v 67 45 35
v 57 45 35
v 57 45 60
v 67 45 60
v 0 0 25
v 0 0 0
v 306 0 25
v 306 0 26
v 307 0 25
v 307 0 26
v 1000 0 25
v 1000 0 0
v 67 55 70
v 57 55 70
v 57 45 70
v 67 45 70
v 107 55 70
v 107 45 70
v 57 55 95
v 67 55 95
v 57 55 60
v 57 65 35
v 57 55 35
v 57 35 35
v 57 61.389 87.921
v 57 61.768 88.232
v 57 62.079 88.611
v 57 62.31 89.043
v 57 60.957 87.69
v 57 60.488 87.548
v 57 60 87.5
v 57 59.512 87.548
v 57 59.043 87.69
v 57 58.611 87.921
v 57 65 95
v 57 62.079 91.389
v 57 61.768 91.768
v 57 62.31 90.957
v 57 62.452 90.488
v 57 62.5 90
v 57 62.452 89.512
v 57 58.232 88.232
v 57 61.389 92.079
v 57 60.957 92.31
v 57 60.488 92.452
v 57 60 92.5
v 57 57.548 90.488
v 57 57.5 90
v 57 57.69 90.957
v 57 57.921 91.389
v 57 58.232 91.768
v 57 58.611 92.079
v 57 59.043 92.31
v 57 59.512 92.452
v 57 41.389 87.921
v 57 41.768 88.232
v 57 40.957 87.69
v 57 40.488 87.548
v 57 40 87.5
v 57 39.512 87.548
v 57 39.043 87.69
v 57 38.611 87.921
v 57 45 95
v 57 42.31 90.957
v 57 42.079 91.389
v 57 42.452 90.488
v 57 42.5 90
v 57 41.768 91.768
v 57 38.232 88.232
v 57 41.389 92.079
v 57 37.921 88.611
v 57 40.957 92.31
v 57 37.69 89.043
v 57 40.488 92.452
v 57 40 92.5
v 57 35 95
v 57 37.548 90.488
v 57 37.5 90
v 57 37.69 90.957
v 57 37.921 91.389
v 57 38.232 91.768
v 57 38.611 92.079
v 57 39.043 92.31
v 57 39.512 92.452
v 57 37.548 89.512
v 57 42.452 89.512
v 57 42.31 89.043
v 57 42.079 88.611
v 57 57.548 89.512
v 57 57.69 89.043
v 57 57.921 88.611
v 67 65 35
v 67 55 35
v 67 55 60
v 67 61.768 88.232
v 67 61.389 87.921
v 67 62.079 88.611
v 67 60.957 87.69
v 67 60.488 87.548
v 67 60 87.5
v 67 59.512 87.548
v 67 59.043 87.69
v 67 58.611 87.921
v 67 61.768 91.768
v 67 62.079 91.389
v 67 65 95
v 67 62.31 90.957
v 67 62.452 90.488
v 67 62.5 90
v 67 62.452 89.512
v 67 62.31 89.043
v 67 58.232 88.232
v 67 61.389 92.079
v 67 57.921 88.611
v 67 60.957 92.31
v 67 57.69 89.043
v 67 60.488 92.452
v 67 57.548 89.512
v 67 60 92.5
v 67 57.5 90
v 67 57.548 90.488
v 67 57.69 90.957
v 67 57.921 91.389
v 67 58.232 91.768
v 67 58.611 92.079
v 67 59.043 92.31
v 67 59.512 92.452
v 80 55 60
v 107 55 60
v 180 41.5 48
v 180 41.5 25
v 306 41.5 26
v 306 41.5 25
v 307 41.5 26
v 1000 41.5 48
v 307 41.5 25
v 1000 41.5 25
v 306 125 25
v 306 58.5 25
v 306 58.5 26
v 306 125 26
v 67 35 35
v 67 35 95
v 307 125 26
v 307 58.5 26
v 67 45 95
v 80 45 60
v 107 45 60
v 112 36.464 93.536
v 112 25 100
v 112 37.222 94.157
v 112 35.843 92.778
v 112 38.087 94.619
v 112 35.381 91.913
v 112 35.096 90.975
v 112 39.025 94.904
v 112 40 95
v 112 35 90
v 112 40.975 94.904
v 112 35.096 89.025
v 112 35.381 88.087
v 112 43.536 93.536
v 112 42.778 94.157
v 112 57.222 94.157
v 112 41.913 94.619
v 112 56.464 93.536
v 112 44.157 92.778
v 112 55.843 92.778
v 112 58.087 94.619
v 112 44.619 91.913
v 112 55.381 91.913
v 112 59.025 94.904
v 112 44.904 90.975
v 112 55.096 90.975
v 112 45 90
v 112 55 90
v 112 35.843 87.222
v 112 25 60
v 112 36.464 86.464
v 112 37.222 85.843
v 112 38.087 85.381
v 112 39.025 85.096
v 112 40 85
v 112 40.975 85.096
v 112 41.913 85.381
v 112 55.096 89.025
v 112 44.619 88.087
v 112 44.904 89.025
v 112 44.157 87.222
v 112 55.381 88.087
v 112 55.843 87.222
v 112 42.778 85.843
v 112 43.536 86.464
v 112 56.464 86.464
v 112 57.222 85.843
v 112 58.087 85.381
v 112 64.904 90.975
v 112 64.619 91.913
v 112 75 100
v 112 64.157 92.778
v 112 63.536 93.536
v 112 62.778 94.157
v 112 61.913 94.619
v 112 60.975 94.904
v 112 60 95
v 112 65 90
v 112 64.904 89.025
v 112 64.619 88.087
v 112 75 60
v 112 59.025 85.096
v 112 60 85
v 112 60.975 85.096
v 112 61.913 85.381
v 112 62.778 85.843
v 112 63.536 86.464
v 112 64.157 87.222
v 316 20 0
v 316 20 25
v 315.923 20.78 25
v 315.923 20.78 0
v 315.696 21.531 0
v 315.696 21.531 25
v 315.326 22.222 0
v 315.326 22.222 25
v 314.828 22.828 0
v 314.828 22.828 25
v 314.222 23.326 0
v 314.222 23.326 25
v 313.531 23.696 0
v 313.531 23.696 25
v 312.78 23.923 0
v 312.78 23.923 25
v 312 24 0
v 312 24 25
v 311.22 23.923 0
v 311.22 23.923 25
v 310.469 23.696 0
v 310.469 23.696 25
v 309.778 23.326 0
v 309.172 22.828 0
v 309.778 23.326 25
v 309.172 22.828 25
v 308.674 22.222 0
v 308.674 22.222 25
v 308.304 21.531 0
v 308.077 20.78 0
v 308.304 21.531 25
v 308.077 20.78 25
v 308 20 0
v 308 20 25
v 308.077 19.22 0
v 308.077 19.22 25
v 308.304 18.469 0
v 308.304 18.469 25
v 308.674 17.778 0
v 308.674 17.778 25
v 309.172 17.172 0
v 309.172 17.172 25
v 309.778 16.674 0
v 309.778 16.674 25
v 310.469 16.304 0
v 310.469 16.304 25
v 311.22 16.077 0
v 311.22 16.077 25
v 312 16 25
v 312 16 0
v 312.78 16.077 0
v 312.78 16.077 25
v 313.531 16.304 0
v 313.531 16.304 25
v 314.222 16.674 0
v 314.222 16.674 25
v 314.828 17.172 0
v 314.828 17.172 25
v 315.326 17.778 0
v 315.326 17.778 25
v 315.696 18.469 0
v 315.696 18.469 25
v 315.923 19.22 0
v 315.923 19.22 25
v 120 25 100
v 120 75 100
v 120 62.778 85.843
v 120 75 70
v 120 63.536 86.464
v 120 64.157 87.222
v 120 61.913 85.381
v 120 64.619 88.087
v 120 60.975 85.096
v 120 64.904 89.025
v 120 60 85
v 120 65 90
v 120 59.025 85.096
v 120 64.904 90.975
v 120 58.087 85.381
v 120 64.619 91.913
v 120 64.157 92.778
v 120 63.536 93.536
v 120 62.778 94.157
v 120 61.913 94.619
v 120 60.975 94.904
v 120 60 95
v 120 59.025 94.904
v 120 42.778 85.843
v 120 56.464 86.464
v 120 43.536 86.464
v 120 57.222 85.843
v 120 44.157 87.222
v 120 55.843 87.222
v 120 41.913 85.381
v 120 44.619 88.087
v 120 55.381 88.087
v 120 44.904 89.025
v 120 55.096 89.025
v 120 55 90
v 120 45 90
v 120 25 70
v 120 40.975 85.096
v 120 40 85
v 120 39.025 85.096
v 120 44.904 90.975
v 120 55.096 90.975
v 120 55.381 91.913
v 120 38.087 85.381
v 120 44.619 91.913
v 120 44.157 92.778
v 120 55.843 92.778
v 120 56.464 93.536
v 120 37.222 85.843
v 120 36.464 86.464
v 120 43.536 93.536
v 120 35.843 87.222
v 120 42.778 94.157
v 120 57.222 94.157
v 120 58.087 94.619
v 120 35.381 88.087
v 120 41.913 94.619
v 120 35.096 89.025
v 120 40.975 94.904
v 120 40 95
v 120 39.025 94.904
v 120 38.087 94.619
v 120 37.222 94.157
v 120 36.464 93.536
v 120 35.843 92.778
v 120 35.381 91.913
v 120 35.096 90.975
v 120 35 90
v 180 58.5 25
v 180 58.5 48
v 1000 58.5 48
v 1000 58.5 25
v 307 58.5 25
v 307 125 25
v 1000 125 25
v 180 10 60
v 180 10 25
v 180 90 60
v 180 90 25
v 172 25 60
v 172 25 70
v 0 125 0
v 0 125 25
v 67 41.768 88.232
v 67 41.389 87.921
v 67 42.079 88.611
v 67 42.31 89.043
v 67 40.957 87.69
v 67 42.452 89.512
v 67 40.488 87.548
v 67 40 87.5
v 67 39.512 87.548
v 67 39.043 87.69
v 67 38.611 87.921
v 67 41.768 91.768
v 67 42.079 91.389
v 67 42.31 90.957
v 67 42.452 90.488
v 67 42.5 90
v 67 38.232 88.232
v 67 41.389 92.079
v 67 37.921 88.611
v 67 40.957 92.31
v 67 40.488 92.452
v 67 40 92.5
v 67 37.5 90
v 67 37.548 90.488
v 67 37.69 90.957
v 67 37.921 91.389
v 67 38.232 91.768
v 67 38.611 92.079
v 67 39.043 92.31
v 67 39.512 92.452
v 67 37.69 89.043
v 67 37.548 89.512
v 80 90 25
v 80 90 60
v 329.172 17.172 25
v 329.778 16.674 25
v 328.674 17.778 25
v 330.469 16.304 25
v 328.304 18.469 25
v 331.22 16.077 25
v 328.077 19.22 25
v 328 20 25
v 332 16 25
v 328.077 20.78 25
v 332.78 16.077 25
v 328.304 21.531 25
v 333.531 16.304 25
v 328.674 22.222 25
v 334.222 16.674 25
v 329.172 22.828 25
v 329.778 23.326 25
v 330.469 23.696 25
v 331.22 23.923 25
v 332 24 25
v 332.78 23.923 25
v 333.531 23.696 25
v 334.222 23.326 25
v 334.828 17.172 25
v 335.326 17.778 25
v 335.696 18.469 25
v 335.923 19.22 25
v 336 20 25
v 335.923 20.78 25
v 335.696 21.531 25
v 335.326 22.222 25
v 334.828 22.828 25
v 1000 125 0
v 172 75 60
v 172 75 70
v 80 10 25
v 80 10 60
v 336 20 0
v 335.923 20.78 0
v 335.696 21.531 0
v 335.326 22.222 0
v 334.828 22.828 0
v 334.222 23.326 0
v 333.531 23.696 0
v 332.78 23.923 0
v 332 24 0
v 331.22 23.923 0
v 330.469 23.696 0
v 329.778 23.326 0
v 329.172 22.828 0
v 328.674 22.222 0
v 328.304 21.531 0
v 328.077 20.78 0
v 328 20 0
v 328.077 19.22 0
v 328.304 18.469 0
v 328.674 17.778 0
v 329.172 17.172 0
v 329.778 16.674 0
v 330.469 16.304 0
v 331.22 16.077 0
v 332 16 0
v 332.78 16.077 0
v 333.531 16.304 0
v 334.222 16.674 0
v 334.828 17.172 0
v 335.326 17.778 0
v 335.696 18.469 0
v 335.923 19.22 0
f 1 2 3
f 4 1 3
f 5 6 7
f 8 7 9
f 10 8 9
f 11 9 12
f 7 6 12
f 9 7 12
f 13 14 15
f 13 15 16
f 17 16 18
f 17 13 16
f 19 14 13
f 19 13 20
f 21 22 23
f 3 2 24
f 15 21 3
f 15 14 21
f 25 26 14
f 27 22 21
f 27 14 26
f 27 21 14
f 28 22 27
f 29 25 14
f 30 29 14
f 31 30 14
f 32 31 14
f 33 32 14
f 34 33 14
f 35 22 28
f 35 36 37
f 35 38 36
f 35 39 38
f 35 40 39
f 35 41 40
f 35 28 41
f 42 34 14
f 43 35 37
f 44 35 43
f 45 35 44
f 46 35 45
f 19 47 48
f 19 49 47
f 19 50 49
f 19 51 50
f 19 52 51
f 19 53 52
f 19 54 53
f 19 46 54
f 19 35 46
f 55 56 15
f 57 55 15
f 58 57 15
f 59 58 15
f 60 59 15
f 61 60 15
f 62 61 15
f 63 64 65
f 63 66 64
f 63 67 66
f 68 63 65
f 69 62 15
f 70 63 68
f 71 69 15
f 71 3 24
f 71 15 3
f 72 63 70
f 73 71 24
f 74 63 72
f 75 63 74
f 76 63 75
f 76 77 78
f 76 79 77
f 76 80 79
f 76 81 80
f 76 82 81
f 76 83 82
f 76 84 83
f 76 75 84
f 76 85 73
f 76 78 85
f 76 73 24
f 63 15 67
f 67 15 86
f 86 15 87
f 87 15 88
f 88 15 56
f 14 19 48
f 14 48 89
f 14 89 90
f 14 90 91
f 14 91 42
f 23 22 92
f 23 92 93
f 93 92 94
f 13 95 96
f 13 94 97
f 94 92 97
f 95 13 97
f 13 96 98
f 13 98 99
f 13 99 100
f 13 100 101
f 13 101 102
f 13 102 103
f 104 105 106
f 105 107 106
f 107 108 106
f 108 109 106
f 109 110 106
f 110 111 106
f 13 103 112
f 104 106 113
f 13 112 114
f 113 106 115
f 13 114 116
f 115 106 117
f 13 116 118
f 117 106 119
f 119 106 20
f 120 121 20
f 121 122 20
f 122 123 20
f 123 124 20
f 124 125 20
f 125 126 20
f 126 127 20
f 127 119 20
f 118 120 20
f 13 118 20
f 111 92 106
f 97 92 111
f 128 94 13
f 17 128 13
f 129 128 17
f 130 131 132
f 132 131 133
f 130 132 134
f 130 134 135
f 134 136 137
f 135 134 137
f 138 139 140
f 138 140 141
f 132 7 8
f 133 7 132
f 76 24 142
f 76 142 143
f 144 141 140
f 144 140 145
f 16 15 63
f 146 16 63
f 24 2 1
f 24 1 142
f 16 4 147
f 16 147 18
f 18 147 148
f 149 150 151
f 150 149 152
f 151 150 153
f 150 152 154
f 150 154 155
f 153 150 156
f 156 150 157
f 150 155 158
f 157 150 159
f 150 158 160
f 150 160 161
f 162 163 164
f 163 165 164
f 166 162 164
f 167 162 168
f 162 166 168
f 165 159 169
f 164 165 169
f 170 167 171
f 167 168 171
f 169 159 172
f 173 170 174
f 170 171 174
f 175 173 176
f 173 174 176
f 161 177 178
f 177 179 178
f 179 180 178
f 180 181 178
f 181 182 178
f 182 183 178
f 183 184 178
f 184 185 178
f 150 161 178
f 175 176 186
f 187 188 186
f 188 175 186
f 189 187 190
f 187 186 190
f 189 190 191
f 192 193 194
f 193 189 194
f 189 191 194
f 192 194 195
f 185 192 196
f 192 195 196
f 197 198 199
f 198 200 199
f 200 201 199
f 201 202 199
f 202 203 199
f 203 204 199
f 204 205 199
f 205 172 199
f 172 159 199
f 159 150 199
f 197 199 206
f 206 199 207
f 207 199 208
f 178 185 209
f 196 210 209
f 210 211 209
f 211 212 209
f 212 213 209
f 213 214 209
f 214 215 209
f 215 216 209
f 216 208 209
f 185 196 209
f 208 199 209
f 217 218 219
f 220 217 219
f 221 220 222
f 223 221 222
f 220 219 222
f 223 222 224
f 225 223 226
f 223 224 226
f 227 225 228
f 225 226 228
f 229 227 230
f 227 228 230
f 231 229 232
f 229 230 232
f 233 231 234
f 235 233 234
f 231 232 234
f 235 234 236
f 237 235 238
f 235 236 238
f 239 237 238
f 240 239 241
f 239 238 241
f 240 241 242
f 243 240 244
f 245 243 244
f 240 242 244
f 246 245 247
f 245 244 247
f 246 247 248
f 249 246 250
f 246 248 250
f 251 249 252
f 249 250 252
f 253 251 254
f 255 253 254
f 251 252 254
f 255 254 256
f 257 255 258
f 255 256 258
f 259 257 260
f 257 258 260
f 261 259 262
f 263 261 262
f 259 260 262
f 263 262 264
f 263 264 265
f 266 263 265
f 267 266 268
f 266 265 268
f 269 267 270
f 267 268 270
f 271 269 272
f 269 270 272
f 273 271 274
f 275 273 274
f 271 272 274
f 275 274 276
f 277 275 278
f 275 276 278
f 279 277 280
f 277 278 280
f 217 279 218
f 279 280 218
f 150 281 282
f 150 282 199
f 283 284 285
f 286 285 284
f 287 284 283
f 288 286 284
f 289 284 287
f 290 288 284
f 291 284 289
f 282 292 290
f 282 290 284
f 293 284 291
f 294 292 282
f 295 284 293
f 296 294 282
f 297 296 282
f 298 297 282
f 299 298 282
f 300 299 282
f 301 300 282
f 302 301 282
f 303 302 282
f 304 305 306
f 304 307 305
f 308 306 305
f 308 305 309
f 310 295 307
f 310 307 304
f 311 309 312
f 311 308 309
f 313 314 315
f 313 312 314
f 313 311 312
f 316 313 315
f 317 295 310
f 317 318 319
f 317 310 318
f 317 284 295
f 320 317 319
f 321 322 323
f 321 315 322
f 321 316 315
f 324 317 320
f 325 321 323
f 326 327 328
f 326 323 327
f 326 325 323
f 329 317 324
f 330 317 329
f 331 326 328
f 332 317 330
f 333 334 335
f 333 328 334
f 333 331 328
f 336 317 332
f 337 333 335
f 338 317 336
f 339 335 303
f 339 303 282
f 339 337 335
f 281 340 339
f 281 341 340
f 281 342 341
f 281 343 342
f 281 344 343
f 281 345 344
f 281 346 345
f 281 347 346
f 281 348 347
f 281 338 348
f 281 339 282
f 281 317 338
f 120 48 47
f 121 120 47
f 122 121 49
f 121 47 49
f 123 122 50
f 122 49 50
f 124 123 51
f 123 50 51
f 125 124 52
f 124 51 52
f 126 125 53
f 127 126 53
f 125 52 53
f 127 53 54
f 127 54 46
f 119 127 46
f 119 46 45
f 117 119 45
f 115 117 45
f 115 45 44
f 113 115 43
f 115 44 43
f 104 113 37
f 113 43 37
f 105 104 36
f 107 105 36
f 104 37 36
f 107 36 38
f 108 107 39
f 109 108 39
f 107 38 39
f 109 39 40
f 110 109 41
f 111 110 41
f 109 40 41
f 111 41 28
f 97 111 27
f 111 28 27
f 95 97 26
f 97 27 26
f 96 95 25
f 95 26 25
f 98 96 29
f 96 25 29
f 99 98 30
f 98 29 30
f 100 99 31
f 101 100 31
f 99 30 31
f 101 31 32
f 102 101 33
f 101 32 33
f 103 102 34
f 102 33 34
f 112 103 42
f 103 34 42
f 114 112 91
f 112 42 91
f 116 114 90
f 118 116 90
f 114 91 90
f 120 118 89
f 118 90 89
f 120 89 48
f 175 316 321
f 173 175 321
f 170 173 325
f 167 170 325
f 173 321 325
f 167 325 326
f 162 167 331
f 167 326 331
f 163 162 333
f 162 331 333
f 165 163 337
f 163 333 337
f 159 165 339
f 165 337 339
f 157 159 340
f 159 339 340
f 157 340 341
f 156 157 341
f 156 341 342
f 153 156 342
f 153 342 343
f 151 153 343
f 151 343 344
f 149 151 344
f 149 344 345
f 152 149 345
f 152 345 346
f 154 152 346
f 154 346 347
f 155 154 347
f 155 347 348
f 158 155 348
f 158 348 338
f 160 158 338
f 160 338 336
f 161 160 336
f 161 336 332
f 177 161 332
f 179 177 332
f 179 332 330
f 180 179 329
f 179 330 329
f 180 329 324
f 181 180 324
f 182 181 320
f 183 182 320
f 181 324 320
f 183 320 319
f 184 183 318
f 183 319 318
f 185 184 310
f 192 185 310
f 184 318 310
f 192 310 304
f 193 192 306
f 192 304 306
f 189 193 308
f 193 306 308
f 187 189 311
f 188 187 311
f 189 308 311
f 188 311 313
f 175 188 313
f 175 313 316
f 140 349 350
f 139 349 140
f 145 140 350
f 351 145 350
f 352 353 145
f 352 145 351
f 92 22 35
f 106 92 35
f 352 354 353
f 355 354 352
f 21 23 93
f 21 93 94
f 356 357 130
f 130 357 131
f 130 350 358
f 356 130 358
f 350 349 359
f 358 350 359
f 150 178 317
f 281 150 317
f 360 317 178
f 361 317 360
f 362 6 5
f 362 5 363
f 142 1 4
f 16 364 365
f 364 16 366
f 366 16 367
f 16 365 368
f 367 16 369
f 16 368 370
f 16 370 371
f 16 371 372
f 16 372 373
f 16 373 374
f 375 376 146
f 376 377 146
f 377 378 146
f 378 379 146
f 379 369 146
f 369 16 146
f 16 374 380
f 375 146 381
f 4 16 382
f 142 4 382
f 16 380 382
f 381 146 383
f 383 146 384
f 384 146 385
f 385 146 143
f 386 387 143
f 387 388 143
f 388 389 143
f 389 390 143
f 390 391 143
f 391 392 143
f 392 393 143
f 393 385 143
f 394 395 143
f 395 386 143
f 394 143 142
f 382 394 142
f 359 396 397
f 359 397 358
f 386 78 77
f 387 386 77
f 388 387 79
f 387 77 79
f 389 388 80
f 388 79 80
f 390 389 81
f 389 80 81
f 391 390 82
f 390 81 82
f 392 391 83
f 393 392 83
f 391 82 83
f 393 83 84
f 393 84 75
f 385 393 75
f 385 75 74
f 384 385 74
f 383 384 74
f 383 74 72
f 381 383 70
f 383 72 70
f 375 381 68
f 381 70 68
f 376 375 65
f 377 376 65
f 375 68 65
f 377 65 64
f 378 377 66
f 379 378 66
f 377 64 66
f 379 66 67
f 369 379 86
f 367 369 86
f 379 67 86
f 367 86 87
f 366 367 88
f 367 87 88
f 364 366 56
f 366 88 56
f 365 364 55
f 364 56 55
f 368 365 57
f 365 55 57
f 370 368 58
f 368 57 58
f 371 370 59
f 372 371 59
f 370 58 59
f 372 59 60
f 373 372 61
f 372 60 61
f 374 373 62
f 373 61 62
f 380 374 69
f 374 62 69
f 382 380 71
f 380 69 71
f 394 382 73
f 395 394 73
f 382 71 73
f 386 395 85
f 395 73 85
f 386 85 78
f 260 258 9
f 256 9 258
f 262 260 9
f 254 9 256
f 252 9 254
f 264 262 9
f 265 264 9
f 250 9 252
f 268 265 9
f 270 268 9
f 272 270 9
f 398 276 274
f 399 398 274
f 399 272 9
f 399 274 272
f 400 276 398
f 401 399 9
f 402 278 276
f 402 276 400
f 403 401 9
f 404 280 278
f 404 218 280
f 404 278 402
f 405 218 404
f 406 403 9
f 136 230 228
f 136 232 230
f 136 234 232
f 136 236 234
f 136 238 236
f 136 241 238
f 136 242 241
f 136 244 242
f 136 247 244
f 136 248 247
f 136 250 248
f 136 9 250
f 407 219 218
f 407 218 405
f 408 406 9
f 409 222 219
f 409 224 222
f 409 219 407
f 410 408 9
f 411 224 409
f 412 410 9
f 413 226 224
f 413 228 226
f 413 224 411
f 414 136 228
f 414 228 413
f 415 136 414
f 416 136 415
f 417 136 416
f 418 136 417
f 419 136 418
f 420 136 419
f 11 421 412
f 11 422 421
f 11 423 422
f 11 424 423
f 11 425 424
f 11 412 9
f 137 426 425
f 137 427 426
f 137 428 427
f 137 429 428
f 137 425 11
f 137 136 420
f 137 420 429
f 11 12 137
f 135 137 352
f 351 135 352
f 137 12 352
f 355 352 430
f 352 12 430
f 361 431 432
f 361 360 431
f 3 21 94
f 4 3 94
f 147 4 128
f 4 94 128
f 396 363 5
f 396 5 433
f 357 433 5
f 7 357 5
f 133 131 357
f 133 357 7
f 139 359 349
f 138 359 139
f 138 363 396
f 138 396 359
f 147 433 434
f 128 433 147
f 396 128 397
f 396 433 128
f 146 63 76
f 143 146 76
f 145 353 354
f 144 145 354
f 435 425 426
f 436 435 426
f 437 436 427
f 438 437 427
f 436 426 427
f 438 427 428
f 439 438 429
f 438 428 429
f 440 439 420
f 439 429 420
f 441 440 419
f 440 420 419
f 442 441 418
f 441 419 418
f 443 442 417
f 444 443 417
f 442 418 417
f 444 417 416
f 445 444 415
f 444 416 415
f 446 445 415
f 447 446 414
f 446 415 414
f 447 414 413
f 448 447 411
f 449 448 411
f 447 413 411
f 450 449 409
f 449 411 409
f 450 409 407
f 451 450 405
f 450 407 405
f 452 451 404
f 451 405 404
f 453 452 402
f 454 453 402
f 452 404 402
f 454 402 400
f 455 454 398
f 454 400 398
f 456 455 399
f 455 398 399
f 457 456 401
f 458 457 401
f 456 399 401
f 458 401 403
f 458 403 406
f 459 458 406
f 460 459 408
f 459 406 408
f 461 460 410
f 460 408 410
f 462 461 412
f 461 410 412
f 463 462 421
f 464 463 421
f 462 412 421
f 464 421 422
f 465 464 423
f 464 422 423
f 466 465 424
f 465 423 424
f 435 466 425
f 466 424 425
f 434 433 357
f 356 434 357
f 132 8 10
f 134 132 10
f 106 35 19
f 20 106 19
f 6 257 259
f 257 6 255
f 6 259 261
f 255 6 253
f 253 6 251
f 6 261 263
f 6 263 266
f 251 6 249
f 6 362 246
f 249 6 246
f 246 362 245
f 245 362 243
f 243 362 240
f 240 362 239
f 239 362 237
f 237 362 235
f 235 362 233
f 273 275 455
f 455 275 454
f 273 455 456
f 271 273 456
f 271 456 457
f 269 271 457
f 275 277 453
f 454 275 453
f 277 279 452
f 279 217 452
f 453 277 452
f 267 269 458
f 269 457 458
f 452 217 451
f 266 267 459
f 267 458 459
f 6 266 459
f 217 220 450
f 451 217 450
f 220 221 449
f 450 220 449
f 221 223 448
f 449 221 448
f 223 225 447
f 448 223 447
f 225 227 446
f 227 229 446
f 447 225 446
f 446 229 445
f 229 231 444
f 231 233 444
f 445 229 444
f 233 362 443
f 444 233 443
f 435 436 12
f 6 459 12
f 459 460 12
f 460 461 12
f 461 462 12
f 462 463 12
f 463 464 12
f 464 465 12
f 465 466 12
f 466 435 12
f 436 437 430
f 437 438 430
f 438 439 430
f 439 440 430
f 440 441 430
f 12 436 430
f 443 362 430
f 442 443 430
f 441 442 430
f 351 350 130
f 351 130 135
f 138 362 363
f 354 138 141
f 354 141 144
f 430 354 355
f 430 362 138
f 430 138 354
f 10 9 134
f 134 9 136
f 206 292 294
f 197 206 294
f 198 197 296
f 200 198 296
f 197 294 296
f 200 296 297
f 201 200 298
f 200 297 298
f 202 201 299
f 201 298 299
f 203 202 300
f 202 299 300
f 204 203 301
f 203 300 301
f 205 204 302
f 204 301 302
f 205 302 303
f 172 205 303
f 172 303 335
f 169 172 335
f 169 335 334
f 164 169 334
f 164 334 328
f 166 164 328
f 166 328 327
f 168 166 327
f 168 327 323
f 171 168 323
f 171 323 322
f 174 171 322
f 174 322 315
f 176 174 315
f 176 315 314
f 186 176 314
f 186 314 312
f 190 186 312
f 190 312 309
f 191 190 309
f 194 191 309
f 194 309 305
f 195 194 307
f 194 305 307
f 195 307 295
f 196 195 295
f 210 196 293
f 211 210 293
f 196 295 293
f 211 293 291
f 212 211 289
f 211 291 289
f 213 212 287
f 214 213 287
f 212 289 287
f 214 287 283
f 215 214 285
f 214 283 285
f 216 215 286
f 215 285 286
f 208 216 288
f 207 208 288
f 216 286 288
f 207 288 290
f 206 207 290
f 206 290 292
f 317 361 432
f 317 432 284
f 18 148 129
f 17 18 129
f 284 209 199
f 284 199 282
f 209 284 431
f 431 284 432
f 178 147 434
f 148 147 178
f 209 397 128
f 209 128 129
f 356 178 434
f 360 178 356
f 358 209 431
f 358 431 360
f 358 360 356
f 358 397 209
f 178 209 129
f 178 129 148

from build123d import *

# Parameters (mm, degrees)
F0_W           = 1000
F0_H           = 125
F1_DEPTH       = 25
F2_W           = 820
F2_H           = 17
F3_DEPTH       = 23
F4_R           = 4
F5_DEPTH       = 25
F6_W           = 100
F6_H           = 80
F7_DEPTH       = 35
F8_W           = 50
F8_H           = 10
F9_DEPTH       = 10
F10_W          = 10
F10_H          = 60
F10_R          = 2.5
F11_DEPTH      = 10
F13_DEPTH      = 20
F13_DEPTH_BACK = 30
F14_R          = 5
F15_DEPTH      = 25
F17_W          = 1
F17_H          = 125
F18_DEPTH      = 1


with BuildPart() as f1:
    # F0 (on Top) → F1 (new body)
    with BuildSketch(Plane.XY):
        with Locations((500, 62.5)):
            Rectangle(F0_W, F0_H)
    extrude(amount=F1_DEPTH)

    # F2 (on face) → F3 (join)
    with BuildSketch(Plane.XY.offset(25)):
        with Locations((590, 50)):
            Rectangle(F2_W, F2_H)
    extrude(amount=F3_DEPTH)

    # F4 (on face) → F5 (cut, through all)
    with BuildSketch(Plane.XY.offset(25)):
        with Locations((312, 20)):
            Circle(F4_R)
        with Locations((332, 20)):
            Circle(F4_R)
    extrude(amount=-F5_DEPTH, mode=Mode.SUBTRACT)

    # F6 (on face) → F7 (join)
    with BuildSketch(Plane.XY.offset(25)):
        with Locations((130, 50)):
            Rectangle(F6_W, F6_H)
    extrude(amount=F7_DEPTH)

    # F8 (on face) → F9 (join)
    with BuildSketch(Plane.XY.offset(60)):
        with Locations((82, 50)):
            Rectangle(F8_W, F8_H)
    extrude(amount=F9_DEPTH)

    # F10 (on face) → F11 (join)
    with BuildSketch(Plane(origin=(57, 0, 0), x_dir=(0, -1, 0), z_dir=(-1, 0, 0))):
        with Locations((-60, 65)):
            Rectangle(F10_W, F10_H)
        with Locations((-60, 90)):
            Circle(F10_R, mode=Mode.SUBTRACT)
        with Locations((-40, 65)):
            Rectangle(F10_W, F10_H)
        with Locations((-40, 90)):
            Circle(F10_R, mode=Mode.SUBTRACT)
    extrude(amount=-F11_DEPTH)

    # F12 (on face) → F13 (join, two sides)
    with BuildSketch(Plane.XZ.offset(-45)) as f13_sk:
        Polygon((112, 60), (172, 60), (172, 70), (120, 70), (120, 100), (112, 100), align=None)
    extrude(amount=F13_DEPTH)
    extrude(f13_sk.sketch, amount=-F13_DEPTH_BACK)

    # F14 (on face) → F15 (cut)
    with BuildSketch(Plane.YZ.offset(120)):
        with Locations((40, 90)):
            Circle(F14_R)
        with Locations((60, 90)):
            Circle(F14_R)
    extrude(amount=-F15_DEPTH, mode=Mode.SUBTRACT)

    # F17 (on face) → F18 (join)
    with BuildSketch(Plane.XY.offset(25)):
        with Locations((306.5, 62.5)):
            Rectangle(F17_W, F17_H)
    extrude(amount=F18_DEPTH)


solid = f1.part
